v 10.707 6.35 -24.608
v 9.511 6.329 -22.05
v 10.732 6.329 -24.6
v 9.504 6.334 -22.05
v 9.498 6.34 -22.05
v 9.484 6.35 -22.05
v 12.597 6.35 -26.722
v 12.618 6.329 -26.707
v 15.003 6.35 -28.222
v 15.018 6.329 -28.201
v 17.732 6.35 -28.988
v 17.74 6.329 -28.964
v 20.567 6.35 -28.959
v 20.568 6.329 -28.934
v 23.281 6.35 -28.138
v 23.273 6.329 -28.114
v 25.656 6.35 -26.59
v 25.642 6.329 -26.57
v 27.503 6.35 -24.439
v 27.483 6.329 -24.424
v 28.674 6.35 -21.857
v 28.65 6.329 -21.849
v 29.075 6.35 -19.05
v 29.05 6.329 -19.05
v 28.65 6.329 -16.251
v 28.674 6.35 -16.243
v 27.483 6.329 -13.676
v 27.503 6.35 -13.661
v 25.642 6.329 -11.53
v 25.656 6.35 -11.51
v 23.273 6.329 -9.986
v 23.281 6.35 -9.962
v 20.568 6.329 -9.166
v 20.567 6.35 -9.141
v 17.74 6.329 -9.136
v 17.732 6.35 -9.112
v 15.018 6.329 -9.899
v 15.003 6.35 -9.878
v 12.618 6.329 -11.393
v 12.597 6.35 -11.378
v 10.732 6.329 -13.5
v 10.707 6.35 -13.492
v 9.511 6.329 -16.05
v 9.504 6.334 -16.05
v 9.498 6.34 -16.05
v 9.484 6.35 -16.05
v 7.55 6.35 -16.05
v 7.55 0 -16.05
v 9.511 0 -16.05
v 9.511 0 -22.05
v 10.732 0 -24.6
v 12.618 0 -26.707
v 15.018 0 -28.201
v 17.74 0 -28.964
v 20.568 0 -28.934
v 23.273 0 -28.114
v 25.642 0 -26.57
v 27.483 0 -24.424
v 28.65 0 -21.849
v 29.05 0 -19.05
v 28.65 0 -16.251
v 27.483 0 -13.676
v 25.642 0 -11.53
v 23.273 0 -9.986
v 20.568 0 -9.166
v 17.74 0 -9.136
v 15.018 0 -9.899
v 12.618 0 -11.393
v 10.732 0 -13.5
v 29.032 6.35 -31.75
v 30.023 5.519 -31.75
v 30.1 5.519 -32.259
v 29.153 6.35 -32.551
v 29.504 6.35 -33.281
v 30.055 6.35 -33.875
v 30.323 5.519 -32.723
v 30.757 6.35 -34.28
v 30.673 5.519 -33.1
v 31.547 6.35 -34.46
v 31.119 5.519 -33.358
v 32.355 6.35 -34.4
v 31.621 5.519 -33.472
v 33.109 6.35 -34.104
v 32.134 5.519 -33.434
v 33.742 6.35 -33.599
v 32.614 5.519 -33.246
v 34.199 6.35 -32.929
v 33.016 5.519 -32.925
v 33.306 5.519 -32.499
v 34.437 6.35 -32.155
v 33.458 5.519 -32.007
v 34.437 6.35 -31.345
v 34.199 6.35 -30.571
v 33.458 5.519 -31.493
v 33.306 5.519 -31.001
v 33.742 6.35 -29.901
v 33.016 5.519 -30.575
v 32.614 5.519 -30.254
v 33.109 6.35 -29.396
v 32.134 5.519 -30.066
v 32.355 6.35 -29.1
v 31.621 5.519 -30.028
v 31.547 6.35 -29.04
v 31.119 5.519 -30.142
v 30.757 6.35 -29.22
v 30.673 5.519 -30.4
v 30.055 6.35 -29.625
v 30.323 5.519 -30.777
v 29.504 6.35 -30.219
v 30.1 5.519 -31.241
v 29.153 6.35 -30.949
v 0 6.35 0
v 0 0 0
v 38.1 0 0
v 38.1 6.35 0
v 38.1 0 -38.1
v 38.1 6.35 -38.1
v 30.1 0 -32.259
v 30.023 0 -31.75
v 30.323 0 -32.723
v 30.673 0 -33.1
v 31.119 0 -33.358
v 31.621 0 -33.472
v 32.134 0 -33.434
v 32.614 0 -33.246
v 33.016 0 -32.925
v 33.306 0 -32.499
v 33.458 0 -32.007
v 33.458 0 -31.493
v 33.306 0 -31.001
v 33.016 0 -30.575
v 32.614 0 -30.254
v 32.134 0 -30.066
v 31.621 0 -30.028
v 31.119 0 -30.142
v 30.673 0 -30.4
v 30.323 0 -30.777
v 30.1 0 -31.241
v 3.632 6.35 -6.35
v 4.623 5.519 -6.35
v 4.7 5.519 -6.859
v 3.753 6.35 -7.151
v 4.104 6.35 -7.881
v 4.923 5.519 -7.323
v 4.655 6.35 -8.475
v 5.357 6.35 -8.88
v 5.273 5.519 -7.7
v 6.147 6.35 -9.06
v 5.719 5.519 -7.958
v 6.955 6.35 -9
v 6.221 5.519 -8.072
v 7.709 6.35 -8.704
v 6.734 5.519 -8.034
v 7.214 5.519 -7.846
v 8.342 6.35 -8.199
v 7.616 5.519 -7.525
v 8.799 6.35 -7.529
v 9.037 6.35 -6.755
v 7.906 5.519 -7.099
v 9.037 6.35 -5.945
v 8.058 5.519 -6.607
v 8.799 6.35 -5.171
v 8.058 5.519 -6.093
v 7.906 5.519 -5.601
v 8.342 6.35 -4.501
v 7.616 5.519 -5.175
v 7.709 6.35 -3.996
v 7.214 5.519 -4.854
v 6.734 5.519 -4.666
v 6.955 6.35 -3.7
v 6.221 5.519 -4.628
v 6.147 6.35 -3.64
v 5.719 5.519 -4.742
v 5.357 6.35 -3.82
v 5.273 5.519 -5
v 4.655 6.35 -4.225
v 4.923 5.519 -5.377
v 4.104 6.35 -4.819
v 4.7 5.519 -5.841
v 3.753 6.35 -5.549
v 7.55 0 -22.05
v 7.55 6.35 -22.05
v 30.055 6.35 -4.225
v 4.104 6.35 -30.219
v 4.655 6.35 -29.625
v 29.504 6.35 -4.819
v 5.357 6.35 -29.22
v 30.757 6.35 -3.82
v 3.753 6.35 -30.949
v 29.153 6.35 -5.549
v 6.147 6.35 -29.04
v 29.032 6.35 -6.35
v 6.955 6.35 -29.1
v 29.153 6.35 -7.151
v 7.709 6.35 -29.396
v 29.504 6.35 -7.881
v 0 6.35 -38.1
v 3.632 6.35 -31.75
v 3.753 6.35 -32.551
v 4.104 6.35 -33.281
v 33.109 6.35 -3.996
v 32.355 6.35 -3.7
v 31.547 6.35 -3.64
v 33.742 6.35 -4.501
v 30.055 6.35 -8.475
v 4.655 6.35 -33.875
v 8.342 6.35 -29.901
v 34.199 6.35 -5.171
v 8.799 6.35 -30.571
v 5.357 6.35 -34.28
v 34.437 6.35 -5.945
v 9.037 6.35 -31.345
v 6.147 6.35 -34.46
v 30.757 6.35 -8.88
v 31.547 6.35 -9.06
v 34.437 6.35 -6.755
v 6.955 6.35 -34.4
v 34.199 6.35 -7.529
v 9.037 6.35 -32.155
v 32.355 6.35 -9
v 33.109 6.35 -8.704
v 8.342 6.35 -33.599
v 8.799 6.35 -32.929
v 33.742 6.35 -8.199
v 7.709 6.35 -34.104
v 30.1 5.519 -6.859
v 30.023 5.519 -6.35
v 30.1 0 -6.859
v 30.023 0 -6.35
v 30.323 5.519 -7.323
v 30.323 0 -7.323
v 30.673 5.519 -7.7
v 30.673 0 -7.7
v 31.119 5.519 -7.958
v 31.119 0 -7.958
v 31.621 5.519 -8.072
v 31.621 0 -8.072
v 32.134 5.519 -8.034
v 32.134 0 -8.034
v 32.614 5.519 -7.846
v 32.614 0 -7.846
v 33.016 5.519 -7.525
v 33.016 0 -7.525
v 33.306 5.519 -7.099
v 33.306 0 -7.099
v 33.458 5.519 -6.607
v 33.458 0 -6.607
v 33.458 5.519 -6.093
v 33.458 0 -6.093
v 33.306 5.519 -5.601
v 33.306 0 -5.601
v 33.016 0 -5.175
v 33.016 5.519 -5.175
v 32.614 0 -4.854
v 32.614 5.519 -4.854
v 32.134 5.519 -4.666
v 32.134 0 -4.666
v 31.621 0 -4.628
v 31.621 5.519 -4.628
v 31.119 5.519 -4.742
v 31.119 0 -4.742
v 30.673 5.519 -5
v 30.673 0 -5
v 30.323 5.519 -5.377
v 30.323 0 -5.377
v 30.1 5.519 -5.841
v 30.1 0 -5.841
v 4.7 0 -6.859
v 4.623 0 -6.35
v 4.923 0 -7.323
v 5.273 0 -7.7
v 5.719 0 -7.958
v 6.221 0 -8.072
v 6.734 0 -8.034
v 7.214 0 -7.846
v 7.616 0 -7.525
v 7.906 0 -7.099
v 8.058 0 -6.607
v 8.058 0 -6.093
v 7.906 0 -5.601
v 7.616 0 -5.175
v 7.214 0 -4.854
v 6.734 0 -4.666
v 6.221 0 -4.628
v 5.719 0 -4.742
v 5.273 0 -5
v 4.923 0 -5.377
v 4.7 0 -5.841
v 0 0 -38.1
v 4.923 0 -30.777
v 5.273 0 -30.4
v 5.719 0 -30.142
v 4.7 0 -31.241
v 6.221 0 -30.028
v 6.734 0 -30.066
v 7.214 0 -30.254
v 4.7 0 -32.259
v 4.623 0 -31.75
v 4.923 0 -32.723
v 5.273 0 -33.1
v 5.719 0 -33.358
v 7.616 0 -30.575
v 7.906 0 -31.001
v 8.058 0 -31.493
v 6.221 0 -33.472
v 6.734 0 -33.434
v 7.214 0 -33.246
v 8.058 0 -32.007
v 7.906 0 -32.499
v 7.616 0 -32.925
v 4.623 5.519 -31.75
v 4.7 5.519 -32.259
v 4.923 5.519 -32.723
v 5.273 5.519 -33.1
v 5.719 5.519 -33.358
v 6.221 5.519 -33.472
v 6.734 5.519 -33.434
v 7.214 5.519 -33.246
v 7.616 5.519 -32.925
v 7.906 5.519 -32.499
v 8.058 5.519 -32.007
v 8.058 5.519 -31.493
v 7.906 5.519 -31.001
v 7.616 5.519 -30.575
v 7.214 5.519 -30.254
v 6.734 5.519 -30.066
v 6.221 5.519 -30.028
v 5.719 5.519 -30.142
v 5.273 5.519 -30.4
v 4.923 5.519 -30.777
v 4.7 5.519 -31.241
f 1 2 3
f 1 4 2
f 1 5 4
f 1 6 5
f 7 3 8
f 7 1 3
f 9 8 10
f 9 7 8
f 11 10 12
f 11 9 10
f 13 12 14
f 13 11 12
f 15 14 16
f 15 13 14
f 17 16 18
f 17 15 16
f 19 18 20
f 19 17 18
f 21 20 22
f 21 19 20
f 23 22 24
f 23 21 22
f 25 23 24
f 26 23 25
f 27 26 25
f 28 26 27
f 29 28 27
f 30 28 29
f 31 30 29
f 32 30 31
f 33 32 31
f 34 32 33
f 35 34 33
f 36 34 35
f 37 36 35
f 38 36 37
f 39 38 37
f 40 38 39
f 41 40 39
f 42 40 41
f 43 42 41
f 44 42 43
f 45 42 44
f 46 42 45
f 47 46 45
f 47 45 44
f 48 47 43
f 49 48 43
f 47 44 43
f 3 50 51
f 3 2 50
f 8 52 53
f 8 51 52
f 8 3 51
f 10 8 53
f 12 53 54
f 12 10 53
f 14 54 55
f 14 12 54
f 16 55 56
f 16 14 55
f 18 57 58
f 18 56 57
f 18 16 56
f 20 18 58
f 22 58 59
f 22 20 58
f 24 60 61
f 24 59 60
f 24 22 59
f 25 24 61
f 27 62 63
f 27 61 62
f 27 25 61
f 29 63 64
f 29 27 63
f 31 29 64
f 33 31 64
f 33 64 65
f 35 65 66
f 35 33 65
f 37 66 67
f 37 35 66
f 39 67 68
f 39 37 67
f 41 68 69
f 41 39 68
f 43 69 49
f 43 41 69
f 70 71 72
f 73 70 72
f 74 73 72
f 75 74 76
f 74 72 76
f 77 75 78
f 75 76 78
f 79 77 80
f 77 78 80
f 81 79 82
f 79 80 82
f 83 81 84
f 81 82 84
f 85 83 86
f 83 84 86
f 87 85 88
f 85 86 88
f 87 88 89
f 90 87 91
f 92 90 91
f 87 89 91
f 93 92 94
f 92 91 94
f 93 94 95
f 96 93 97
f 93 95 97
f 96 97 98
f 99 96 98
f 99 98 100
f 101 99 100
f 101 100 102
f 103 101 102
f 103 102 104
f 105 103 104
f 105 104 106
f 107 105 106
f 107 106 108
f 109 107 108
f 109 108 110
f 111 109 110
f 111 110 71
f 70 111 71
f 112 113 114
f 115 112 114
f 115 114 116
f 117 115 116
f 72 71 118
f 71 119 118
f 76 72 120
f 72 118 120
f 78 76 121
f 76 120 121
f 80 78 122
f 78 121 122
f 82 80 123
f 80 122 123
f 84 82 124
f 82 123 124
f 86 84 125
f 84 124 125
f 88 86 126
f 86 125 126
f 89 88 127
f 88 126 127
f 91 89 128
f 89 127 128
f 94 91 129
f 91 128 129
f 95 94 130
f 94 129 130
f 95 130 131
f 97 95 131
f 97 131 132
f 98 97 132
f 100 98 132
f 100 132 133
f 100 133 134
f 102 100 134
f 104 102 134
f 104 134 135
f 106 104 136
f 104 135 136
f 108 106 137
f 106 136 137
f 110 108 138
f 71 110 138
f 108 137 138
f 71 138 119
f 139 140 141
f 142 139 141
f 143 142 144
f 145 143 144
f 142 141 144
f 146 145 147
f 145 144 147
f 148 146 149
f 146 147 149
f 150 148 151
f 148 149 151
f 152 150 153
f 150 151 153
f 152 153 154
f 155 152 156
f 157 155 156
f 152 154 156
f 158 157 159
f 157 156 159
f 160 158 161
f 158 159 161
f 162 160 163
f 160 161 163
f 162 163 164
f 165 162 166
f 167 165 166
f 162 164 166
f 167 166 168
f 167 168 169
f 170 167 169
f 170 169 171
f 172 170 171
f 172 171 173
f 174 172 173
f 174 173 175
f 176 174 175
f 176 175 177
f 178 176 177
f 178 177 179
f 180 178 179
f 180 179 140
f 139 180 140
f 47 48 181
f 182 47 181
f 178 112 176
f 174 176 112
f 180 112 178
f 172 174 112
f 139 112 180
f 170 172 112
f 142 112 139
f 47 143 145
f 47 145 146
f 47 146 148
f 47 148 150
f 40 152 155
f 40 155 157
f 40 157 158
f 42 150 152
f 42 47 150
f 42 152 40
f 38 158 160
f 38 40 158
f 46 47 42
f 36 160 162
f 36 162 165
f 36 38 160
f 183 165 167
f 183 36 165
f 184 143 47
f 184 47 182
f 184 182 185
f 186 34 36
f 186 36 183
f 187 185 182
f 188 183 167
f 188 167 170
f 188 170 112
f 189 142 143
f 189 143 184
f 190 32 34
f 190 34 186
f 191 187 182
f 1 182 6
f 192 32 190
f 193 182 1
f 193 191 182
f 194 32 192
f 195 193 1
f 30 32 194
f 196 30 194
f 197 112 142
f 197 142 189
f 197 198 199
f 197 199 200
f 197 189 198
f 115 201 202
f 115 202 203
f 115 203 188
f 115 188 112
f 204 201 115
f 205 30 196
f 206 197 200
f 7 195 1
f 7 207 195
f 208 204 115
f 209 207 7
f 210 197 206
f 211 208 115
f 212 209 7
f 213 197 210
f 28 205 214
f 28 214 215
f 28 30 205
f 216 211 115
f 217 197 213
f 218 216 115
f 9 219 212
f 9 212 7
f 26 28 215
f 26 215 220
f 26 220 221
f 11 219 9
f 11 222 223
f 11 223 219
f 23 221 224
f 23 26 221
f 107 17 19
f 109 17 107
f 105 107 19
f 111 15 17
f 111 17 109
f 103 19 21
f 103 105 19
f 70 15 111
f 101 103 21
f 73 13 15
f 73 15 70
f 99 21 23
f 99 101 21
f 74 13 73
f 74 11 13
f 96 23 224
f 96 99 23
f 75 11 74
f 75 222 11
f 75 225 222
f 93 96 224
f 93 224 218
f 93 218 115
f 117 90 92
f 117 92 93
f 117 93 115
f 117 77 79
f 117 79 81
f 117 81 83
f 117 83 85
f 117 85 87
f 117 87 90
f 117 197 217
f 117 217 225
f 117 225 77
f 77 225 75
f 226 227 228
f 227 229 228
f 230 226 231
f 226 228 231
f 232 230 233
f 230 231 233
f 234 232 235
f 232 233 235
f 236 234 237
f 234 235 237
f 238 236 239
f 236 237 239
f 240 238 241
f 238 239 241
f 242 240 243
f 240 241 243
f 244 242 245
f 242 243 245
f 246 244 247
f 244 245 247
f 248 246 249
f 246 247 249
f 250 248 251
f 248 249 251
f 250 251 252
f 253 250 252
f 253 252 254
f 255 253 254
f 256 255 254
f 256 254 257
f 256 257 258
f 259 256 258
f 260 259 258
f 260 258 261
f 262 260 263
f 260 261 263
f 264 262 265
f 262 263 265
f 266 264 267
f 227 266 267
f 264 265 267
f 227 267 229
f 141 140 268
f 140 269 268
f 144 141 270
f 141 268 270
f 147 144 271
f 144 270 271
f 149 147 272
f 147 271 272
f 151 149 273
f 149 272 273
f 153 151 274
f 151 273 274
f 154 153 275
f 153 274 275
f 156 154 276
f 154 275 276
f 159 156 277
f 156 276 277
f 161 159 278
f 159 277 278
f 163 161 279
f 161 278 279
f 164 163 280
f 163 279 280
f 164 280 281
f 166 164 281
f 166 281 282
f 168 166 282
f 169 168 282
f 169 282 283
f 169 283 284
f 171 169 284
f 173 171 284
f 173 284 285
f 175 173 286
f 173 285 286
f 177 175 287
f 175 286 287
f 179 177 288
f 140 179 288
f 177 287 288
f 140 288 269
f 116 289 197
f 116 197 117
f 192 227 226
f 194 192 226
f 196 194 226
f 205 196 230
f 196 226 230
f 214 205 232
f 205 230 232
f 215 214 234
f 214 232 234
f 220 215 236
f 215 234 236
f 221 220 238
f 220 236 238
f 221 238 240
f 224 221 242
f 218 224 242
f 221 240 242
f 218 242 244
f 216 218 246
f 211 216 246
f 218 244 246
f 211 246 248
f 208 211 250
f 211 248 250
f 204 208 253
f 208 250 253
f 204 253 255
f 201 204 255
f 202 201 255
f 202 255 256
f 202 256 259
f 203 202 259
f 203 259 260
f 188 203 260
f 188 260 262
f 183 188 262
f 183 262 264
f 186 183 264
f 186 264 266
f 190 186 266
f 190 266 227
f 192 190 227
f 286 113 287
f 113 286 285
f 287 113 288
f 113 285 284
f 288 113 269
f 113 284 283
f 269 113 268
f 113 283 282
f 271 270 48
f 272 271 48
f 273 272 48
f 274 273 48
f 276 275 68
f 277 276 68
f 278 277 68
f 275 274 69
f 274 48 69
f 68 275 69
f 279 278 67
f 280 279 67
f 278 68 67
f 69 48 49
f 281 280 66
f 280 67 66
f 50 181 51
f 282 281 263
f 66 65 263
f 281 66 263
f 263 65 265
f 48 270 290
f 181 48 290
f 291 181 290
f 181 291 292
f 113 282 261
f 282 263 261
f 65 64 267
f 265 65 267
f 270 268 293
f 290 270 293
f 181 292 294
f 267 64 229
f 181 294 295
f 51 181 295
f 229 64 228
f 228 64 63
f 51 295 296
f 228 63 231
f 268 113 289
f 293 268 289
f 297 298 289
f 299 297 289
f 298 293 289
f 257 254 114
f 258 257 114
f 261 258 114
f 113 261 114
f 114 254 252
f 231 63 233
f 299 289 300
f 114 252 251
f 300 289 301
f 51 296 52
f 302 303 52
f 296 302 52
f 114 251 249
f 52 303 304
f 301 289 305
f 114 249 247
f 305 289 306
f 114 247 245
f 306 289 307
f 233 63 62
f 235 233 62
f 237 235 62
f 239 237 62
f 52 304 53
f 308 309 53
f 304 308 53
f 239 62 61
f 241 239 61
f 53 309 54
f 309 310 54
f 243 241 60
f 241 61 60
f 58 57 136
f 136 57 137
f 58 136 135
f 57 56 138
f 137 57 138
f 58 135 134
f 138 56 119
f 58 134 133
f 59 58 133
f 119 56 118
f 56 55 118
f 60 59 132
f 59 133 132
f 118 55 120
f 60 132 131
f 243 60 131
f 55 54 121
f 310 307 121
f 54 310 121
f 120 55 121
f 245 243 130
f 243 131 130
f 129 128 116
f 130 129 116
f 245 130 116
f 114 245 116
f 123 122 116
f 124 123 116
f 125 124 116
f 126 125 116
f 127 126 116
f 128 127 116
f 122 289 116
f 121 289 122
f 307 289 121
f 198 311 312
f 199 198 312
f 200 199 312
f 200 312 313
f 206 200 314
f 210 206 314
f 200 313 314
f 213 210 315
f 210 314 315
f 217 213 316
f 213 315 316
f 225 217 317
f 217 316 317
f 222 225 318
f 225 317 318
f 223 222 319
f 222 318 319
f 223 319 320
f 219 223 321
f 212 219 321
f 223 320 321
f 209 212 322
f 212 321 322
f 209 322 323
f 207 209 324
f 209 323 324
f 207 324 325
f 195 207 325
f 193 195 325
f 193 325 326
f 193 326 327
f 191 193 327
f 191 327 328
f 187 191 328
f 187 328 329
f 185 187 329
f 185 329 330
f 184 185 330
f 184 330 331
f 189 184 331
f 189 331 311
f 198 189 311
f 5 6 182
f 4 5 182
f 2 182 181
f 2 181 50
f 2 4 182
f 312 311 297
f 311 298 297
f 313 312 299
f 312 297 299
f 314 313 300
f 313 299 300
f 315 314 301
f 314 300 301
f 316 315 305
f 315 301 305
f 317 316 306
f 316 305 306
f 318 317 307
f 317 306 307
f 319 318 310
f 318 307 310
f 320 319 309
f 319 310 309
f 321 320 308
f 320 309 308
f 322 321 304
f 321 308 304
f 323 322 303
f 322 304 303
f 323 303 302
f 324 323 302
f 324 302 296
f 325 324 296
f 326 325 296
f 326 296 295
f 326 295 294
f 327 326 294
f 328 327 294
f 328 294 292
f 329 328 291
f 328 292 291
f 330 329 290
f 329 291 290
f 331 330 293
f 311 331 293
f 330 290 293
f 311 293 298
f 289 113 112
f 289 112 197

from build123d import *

# Parameters (mm, degrees)
SKETCH1_W                       = 38.1
SKETCH1_H                       = 38.1
BOSS_EXTRUDE1_DEPTH             = 6.35
F_8_32_TAPPED_HOLE1_D           = 3.4544
F_8_32_TAPPED_HOLE1_CSINK_D     = 5.4356
F_8_32_TAPPED_HOLE1_CSINK_ANGLE = 100
SKETCH6_W                       = 6
SKETCH6_H                       = 6
CUT_EXTRUDE1_DEPTH              = 55.254423783


with BuildPart() as part:
    # Sketch1 → Boss-Extrude1 (new body)
    with BuildSketch(Plane(origin=(0, 0, 0), x_dir=(1, 0, 0), z_dir=(0, 1, 0))):
        with Locations((19.05, 19.05)):
            Rectangle(SKETCH1_W, SKETCH1_H)
    extrude(amount=BOSS_EXTRUDE1_DEPTH)

    # #8-32 Tapped Hole1 (through all)
    with Locations(Plane(origin=(0, 6.35, 0), x_dir=(1, 0, 0), z_dir=(0, 1, 0))):
        with Locations((31.75, 31.75), (6.35, 31.75), (6.35, 6.35), (31.75, 6.35)):
            CounterSinkHole(F_8_32_TAPPED_HOLE1_D / 2, F_8_32_TAPPED_HOLE1_CSINK_D / 2, counter_sink_angle=F_8_32_TAPPED_HOLE1_CSINK_ANGLE)

    # Sketch5 → M18 Clearance Hole1 (revolve, cut)
    with BuildSketch(Plane(origin=(19.05, 6.35, -19.05), x_dir=(0, 0, 1), z_dir=(1, 0, 0))):
        Polygon((0, 0), (0, 6.35), (10, 6.35), (10, 0.020977491), (10.025, 0), align=None)
    revolve(axis=Axis((19.05, 12.7, -19.05), (0, -1, 0)), mode=Mode.SUBTRACT)

    # Sketch6 → Cut-Extrude1 (cut, through all)
    with BuildSketch(Plane(origin=(0, 6.35, 0), x_dir=(1, 0, 0), z_dir=(0, 1, 0))):
        with Locations((10.55, 19.05)):
            Rectangle(SKETCH6_W, SKETCH6_H)
    extrude(amount=-CUT_EXTRUDE1_DEPTH, mode=Mode.SUBTRACT)


solid = part.part
